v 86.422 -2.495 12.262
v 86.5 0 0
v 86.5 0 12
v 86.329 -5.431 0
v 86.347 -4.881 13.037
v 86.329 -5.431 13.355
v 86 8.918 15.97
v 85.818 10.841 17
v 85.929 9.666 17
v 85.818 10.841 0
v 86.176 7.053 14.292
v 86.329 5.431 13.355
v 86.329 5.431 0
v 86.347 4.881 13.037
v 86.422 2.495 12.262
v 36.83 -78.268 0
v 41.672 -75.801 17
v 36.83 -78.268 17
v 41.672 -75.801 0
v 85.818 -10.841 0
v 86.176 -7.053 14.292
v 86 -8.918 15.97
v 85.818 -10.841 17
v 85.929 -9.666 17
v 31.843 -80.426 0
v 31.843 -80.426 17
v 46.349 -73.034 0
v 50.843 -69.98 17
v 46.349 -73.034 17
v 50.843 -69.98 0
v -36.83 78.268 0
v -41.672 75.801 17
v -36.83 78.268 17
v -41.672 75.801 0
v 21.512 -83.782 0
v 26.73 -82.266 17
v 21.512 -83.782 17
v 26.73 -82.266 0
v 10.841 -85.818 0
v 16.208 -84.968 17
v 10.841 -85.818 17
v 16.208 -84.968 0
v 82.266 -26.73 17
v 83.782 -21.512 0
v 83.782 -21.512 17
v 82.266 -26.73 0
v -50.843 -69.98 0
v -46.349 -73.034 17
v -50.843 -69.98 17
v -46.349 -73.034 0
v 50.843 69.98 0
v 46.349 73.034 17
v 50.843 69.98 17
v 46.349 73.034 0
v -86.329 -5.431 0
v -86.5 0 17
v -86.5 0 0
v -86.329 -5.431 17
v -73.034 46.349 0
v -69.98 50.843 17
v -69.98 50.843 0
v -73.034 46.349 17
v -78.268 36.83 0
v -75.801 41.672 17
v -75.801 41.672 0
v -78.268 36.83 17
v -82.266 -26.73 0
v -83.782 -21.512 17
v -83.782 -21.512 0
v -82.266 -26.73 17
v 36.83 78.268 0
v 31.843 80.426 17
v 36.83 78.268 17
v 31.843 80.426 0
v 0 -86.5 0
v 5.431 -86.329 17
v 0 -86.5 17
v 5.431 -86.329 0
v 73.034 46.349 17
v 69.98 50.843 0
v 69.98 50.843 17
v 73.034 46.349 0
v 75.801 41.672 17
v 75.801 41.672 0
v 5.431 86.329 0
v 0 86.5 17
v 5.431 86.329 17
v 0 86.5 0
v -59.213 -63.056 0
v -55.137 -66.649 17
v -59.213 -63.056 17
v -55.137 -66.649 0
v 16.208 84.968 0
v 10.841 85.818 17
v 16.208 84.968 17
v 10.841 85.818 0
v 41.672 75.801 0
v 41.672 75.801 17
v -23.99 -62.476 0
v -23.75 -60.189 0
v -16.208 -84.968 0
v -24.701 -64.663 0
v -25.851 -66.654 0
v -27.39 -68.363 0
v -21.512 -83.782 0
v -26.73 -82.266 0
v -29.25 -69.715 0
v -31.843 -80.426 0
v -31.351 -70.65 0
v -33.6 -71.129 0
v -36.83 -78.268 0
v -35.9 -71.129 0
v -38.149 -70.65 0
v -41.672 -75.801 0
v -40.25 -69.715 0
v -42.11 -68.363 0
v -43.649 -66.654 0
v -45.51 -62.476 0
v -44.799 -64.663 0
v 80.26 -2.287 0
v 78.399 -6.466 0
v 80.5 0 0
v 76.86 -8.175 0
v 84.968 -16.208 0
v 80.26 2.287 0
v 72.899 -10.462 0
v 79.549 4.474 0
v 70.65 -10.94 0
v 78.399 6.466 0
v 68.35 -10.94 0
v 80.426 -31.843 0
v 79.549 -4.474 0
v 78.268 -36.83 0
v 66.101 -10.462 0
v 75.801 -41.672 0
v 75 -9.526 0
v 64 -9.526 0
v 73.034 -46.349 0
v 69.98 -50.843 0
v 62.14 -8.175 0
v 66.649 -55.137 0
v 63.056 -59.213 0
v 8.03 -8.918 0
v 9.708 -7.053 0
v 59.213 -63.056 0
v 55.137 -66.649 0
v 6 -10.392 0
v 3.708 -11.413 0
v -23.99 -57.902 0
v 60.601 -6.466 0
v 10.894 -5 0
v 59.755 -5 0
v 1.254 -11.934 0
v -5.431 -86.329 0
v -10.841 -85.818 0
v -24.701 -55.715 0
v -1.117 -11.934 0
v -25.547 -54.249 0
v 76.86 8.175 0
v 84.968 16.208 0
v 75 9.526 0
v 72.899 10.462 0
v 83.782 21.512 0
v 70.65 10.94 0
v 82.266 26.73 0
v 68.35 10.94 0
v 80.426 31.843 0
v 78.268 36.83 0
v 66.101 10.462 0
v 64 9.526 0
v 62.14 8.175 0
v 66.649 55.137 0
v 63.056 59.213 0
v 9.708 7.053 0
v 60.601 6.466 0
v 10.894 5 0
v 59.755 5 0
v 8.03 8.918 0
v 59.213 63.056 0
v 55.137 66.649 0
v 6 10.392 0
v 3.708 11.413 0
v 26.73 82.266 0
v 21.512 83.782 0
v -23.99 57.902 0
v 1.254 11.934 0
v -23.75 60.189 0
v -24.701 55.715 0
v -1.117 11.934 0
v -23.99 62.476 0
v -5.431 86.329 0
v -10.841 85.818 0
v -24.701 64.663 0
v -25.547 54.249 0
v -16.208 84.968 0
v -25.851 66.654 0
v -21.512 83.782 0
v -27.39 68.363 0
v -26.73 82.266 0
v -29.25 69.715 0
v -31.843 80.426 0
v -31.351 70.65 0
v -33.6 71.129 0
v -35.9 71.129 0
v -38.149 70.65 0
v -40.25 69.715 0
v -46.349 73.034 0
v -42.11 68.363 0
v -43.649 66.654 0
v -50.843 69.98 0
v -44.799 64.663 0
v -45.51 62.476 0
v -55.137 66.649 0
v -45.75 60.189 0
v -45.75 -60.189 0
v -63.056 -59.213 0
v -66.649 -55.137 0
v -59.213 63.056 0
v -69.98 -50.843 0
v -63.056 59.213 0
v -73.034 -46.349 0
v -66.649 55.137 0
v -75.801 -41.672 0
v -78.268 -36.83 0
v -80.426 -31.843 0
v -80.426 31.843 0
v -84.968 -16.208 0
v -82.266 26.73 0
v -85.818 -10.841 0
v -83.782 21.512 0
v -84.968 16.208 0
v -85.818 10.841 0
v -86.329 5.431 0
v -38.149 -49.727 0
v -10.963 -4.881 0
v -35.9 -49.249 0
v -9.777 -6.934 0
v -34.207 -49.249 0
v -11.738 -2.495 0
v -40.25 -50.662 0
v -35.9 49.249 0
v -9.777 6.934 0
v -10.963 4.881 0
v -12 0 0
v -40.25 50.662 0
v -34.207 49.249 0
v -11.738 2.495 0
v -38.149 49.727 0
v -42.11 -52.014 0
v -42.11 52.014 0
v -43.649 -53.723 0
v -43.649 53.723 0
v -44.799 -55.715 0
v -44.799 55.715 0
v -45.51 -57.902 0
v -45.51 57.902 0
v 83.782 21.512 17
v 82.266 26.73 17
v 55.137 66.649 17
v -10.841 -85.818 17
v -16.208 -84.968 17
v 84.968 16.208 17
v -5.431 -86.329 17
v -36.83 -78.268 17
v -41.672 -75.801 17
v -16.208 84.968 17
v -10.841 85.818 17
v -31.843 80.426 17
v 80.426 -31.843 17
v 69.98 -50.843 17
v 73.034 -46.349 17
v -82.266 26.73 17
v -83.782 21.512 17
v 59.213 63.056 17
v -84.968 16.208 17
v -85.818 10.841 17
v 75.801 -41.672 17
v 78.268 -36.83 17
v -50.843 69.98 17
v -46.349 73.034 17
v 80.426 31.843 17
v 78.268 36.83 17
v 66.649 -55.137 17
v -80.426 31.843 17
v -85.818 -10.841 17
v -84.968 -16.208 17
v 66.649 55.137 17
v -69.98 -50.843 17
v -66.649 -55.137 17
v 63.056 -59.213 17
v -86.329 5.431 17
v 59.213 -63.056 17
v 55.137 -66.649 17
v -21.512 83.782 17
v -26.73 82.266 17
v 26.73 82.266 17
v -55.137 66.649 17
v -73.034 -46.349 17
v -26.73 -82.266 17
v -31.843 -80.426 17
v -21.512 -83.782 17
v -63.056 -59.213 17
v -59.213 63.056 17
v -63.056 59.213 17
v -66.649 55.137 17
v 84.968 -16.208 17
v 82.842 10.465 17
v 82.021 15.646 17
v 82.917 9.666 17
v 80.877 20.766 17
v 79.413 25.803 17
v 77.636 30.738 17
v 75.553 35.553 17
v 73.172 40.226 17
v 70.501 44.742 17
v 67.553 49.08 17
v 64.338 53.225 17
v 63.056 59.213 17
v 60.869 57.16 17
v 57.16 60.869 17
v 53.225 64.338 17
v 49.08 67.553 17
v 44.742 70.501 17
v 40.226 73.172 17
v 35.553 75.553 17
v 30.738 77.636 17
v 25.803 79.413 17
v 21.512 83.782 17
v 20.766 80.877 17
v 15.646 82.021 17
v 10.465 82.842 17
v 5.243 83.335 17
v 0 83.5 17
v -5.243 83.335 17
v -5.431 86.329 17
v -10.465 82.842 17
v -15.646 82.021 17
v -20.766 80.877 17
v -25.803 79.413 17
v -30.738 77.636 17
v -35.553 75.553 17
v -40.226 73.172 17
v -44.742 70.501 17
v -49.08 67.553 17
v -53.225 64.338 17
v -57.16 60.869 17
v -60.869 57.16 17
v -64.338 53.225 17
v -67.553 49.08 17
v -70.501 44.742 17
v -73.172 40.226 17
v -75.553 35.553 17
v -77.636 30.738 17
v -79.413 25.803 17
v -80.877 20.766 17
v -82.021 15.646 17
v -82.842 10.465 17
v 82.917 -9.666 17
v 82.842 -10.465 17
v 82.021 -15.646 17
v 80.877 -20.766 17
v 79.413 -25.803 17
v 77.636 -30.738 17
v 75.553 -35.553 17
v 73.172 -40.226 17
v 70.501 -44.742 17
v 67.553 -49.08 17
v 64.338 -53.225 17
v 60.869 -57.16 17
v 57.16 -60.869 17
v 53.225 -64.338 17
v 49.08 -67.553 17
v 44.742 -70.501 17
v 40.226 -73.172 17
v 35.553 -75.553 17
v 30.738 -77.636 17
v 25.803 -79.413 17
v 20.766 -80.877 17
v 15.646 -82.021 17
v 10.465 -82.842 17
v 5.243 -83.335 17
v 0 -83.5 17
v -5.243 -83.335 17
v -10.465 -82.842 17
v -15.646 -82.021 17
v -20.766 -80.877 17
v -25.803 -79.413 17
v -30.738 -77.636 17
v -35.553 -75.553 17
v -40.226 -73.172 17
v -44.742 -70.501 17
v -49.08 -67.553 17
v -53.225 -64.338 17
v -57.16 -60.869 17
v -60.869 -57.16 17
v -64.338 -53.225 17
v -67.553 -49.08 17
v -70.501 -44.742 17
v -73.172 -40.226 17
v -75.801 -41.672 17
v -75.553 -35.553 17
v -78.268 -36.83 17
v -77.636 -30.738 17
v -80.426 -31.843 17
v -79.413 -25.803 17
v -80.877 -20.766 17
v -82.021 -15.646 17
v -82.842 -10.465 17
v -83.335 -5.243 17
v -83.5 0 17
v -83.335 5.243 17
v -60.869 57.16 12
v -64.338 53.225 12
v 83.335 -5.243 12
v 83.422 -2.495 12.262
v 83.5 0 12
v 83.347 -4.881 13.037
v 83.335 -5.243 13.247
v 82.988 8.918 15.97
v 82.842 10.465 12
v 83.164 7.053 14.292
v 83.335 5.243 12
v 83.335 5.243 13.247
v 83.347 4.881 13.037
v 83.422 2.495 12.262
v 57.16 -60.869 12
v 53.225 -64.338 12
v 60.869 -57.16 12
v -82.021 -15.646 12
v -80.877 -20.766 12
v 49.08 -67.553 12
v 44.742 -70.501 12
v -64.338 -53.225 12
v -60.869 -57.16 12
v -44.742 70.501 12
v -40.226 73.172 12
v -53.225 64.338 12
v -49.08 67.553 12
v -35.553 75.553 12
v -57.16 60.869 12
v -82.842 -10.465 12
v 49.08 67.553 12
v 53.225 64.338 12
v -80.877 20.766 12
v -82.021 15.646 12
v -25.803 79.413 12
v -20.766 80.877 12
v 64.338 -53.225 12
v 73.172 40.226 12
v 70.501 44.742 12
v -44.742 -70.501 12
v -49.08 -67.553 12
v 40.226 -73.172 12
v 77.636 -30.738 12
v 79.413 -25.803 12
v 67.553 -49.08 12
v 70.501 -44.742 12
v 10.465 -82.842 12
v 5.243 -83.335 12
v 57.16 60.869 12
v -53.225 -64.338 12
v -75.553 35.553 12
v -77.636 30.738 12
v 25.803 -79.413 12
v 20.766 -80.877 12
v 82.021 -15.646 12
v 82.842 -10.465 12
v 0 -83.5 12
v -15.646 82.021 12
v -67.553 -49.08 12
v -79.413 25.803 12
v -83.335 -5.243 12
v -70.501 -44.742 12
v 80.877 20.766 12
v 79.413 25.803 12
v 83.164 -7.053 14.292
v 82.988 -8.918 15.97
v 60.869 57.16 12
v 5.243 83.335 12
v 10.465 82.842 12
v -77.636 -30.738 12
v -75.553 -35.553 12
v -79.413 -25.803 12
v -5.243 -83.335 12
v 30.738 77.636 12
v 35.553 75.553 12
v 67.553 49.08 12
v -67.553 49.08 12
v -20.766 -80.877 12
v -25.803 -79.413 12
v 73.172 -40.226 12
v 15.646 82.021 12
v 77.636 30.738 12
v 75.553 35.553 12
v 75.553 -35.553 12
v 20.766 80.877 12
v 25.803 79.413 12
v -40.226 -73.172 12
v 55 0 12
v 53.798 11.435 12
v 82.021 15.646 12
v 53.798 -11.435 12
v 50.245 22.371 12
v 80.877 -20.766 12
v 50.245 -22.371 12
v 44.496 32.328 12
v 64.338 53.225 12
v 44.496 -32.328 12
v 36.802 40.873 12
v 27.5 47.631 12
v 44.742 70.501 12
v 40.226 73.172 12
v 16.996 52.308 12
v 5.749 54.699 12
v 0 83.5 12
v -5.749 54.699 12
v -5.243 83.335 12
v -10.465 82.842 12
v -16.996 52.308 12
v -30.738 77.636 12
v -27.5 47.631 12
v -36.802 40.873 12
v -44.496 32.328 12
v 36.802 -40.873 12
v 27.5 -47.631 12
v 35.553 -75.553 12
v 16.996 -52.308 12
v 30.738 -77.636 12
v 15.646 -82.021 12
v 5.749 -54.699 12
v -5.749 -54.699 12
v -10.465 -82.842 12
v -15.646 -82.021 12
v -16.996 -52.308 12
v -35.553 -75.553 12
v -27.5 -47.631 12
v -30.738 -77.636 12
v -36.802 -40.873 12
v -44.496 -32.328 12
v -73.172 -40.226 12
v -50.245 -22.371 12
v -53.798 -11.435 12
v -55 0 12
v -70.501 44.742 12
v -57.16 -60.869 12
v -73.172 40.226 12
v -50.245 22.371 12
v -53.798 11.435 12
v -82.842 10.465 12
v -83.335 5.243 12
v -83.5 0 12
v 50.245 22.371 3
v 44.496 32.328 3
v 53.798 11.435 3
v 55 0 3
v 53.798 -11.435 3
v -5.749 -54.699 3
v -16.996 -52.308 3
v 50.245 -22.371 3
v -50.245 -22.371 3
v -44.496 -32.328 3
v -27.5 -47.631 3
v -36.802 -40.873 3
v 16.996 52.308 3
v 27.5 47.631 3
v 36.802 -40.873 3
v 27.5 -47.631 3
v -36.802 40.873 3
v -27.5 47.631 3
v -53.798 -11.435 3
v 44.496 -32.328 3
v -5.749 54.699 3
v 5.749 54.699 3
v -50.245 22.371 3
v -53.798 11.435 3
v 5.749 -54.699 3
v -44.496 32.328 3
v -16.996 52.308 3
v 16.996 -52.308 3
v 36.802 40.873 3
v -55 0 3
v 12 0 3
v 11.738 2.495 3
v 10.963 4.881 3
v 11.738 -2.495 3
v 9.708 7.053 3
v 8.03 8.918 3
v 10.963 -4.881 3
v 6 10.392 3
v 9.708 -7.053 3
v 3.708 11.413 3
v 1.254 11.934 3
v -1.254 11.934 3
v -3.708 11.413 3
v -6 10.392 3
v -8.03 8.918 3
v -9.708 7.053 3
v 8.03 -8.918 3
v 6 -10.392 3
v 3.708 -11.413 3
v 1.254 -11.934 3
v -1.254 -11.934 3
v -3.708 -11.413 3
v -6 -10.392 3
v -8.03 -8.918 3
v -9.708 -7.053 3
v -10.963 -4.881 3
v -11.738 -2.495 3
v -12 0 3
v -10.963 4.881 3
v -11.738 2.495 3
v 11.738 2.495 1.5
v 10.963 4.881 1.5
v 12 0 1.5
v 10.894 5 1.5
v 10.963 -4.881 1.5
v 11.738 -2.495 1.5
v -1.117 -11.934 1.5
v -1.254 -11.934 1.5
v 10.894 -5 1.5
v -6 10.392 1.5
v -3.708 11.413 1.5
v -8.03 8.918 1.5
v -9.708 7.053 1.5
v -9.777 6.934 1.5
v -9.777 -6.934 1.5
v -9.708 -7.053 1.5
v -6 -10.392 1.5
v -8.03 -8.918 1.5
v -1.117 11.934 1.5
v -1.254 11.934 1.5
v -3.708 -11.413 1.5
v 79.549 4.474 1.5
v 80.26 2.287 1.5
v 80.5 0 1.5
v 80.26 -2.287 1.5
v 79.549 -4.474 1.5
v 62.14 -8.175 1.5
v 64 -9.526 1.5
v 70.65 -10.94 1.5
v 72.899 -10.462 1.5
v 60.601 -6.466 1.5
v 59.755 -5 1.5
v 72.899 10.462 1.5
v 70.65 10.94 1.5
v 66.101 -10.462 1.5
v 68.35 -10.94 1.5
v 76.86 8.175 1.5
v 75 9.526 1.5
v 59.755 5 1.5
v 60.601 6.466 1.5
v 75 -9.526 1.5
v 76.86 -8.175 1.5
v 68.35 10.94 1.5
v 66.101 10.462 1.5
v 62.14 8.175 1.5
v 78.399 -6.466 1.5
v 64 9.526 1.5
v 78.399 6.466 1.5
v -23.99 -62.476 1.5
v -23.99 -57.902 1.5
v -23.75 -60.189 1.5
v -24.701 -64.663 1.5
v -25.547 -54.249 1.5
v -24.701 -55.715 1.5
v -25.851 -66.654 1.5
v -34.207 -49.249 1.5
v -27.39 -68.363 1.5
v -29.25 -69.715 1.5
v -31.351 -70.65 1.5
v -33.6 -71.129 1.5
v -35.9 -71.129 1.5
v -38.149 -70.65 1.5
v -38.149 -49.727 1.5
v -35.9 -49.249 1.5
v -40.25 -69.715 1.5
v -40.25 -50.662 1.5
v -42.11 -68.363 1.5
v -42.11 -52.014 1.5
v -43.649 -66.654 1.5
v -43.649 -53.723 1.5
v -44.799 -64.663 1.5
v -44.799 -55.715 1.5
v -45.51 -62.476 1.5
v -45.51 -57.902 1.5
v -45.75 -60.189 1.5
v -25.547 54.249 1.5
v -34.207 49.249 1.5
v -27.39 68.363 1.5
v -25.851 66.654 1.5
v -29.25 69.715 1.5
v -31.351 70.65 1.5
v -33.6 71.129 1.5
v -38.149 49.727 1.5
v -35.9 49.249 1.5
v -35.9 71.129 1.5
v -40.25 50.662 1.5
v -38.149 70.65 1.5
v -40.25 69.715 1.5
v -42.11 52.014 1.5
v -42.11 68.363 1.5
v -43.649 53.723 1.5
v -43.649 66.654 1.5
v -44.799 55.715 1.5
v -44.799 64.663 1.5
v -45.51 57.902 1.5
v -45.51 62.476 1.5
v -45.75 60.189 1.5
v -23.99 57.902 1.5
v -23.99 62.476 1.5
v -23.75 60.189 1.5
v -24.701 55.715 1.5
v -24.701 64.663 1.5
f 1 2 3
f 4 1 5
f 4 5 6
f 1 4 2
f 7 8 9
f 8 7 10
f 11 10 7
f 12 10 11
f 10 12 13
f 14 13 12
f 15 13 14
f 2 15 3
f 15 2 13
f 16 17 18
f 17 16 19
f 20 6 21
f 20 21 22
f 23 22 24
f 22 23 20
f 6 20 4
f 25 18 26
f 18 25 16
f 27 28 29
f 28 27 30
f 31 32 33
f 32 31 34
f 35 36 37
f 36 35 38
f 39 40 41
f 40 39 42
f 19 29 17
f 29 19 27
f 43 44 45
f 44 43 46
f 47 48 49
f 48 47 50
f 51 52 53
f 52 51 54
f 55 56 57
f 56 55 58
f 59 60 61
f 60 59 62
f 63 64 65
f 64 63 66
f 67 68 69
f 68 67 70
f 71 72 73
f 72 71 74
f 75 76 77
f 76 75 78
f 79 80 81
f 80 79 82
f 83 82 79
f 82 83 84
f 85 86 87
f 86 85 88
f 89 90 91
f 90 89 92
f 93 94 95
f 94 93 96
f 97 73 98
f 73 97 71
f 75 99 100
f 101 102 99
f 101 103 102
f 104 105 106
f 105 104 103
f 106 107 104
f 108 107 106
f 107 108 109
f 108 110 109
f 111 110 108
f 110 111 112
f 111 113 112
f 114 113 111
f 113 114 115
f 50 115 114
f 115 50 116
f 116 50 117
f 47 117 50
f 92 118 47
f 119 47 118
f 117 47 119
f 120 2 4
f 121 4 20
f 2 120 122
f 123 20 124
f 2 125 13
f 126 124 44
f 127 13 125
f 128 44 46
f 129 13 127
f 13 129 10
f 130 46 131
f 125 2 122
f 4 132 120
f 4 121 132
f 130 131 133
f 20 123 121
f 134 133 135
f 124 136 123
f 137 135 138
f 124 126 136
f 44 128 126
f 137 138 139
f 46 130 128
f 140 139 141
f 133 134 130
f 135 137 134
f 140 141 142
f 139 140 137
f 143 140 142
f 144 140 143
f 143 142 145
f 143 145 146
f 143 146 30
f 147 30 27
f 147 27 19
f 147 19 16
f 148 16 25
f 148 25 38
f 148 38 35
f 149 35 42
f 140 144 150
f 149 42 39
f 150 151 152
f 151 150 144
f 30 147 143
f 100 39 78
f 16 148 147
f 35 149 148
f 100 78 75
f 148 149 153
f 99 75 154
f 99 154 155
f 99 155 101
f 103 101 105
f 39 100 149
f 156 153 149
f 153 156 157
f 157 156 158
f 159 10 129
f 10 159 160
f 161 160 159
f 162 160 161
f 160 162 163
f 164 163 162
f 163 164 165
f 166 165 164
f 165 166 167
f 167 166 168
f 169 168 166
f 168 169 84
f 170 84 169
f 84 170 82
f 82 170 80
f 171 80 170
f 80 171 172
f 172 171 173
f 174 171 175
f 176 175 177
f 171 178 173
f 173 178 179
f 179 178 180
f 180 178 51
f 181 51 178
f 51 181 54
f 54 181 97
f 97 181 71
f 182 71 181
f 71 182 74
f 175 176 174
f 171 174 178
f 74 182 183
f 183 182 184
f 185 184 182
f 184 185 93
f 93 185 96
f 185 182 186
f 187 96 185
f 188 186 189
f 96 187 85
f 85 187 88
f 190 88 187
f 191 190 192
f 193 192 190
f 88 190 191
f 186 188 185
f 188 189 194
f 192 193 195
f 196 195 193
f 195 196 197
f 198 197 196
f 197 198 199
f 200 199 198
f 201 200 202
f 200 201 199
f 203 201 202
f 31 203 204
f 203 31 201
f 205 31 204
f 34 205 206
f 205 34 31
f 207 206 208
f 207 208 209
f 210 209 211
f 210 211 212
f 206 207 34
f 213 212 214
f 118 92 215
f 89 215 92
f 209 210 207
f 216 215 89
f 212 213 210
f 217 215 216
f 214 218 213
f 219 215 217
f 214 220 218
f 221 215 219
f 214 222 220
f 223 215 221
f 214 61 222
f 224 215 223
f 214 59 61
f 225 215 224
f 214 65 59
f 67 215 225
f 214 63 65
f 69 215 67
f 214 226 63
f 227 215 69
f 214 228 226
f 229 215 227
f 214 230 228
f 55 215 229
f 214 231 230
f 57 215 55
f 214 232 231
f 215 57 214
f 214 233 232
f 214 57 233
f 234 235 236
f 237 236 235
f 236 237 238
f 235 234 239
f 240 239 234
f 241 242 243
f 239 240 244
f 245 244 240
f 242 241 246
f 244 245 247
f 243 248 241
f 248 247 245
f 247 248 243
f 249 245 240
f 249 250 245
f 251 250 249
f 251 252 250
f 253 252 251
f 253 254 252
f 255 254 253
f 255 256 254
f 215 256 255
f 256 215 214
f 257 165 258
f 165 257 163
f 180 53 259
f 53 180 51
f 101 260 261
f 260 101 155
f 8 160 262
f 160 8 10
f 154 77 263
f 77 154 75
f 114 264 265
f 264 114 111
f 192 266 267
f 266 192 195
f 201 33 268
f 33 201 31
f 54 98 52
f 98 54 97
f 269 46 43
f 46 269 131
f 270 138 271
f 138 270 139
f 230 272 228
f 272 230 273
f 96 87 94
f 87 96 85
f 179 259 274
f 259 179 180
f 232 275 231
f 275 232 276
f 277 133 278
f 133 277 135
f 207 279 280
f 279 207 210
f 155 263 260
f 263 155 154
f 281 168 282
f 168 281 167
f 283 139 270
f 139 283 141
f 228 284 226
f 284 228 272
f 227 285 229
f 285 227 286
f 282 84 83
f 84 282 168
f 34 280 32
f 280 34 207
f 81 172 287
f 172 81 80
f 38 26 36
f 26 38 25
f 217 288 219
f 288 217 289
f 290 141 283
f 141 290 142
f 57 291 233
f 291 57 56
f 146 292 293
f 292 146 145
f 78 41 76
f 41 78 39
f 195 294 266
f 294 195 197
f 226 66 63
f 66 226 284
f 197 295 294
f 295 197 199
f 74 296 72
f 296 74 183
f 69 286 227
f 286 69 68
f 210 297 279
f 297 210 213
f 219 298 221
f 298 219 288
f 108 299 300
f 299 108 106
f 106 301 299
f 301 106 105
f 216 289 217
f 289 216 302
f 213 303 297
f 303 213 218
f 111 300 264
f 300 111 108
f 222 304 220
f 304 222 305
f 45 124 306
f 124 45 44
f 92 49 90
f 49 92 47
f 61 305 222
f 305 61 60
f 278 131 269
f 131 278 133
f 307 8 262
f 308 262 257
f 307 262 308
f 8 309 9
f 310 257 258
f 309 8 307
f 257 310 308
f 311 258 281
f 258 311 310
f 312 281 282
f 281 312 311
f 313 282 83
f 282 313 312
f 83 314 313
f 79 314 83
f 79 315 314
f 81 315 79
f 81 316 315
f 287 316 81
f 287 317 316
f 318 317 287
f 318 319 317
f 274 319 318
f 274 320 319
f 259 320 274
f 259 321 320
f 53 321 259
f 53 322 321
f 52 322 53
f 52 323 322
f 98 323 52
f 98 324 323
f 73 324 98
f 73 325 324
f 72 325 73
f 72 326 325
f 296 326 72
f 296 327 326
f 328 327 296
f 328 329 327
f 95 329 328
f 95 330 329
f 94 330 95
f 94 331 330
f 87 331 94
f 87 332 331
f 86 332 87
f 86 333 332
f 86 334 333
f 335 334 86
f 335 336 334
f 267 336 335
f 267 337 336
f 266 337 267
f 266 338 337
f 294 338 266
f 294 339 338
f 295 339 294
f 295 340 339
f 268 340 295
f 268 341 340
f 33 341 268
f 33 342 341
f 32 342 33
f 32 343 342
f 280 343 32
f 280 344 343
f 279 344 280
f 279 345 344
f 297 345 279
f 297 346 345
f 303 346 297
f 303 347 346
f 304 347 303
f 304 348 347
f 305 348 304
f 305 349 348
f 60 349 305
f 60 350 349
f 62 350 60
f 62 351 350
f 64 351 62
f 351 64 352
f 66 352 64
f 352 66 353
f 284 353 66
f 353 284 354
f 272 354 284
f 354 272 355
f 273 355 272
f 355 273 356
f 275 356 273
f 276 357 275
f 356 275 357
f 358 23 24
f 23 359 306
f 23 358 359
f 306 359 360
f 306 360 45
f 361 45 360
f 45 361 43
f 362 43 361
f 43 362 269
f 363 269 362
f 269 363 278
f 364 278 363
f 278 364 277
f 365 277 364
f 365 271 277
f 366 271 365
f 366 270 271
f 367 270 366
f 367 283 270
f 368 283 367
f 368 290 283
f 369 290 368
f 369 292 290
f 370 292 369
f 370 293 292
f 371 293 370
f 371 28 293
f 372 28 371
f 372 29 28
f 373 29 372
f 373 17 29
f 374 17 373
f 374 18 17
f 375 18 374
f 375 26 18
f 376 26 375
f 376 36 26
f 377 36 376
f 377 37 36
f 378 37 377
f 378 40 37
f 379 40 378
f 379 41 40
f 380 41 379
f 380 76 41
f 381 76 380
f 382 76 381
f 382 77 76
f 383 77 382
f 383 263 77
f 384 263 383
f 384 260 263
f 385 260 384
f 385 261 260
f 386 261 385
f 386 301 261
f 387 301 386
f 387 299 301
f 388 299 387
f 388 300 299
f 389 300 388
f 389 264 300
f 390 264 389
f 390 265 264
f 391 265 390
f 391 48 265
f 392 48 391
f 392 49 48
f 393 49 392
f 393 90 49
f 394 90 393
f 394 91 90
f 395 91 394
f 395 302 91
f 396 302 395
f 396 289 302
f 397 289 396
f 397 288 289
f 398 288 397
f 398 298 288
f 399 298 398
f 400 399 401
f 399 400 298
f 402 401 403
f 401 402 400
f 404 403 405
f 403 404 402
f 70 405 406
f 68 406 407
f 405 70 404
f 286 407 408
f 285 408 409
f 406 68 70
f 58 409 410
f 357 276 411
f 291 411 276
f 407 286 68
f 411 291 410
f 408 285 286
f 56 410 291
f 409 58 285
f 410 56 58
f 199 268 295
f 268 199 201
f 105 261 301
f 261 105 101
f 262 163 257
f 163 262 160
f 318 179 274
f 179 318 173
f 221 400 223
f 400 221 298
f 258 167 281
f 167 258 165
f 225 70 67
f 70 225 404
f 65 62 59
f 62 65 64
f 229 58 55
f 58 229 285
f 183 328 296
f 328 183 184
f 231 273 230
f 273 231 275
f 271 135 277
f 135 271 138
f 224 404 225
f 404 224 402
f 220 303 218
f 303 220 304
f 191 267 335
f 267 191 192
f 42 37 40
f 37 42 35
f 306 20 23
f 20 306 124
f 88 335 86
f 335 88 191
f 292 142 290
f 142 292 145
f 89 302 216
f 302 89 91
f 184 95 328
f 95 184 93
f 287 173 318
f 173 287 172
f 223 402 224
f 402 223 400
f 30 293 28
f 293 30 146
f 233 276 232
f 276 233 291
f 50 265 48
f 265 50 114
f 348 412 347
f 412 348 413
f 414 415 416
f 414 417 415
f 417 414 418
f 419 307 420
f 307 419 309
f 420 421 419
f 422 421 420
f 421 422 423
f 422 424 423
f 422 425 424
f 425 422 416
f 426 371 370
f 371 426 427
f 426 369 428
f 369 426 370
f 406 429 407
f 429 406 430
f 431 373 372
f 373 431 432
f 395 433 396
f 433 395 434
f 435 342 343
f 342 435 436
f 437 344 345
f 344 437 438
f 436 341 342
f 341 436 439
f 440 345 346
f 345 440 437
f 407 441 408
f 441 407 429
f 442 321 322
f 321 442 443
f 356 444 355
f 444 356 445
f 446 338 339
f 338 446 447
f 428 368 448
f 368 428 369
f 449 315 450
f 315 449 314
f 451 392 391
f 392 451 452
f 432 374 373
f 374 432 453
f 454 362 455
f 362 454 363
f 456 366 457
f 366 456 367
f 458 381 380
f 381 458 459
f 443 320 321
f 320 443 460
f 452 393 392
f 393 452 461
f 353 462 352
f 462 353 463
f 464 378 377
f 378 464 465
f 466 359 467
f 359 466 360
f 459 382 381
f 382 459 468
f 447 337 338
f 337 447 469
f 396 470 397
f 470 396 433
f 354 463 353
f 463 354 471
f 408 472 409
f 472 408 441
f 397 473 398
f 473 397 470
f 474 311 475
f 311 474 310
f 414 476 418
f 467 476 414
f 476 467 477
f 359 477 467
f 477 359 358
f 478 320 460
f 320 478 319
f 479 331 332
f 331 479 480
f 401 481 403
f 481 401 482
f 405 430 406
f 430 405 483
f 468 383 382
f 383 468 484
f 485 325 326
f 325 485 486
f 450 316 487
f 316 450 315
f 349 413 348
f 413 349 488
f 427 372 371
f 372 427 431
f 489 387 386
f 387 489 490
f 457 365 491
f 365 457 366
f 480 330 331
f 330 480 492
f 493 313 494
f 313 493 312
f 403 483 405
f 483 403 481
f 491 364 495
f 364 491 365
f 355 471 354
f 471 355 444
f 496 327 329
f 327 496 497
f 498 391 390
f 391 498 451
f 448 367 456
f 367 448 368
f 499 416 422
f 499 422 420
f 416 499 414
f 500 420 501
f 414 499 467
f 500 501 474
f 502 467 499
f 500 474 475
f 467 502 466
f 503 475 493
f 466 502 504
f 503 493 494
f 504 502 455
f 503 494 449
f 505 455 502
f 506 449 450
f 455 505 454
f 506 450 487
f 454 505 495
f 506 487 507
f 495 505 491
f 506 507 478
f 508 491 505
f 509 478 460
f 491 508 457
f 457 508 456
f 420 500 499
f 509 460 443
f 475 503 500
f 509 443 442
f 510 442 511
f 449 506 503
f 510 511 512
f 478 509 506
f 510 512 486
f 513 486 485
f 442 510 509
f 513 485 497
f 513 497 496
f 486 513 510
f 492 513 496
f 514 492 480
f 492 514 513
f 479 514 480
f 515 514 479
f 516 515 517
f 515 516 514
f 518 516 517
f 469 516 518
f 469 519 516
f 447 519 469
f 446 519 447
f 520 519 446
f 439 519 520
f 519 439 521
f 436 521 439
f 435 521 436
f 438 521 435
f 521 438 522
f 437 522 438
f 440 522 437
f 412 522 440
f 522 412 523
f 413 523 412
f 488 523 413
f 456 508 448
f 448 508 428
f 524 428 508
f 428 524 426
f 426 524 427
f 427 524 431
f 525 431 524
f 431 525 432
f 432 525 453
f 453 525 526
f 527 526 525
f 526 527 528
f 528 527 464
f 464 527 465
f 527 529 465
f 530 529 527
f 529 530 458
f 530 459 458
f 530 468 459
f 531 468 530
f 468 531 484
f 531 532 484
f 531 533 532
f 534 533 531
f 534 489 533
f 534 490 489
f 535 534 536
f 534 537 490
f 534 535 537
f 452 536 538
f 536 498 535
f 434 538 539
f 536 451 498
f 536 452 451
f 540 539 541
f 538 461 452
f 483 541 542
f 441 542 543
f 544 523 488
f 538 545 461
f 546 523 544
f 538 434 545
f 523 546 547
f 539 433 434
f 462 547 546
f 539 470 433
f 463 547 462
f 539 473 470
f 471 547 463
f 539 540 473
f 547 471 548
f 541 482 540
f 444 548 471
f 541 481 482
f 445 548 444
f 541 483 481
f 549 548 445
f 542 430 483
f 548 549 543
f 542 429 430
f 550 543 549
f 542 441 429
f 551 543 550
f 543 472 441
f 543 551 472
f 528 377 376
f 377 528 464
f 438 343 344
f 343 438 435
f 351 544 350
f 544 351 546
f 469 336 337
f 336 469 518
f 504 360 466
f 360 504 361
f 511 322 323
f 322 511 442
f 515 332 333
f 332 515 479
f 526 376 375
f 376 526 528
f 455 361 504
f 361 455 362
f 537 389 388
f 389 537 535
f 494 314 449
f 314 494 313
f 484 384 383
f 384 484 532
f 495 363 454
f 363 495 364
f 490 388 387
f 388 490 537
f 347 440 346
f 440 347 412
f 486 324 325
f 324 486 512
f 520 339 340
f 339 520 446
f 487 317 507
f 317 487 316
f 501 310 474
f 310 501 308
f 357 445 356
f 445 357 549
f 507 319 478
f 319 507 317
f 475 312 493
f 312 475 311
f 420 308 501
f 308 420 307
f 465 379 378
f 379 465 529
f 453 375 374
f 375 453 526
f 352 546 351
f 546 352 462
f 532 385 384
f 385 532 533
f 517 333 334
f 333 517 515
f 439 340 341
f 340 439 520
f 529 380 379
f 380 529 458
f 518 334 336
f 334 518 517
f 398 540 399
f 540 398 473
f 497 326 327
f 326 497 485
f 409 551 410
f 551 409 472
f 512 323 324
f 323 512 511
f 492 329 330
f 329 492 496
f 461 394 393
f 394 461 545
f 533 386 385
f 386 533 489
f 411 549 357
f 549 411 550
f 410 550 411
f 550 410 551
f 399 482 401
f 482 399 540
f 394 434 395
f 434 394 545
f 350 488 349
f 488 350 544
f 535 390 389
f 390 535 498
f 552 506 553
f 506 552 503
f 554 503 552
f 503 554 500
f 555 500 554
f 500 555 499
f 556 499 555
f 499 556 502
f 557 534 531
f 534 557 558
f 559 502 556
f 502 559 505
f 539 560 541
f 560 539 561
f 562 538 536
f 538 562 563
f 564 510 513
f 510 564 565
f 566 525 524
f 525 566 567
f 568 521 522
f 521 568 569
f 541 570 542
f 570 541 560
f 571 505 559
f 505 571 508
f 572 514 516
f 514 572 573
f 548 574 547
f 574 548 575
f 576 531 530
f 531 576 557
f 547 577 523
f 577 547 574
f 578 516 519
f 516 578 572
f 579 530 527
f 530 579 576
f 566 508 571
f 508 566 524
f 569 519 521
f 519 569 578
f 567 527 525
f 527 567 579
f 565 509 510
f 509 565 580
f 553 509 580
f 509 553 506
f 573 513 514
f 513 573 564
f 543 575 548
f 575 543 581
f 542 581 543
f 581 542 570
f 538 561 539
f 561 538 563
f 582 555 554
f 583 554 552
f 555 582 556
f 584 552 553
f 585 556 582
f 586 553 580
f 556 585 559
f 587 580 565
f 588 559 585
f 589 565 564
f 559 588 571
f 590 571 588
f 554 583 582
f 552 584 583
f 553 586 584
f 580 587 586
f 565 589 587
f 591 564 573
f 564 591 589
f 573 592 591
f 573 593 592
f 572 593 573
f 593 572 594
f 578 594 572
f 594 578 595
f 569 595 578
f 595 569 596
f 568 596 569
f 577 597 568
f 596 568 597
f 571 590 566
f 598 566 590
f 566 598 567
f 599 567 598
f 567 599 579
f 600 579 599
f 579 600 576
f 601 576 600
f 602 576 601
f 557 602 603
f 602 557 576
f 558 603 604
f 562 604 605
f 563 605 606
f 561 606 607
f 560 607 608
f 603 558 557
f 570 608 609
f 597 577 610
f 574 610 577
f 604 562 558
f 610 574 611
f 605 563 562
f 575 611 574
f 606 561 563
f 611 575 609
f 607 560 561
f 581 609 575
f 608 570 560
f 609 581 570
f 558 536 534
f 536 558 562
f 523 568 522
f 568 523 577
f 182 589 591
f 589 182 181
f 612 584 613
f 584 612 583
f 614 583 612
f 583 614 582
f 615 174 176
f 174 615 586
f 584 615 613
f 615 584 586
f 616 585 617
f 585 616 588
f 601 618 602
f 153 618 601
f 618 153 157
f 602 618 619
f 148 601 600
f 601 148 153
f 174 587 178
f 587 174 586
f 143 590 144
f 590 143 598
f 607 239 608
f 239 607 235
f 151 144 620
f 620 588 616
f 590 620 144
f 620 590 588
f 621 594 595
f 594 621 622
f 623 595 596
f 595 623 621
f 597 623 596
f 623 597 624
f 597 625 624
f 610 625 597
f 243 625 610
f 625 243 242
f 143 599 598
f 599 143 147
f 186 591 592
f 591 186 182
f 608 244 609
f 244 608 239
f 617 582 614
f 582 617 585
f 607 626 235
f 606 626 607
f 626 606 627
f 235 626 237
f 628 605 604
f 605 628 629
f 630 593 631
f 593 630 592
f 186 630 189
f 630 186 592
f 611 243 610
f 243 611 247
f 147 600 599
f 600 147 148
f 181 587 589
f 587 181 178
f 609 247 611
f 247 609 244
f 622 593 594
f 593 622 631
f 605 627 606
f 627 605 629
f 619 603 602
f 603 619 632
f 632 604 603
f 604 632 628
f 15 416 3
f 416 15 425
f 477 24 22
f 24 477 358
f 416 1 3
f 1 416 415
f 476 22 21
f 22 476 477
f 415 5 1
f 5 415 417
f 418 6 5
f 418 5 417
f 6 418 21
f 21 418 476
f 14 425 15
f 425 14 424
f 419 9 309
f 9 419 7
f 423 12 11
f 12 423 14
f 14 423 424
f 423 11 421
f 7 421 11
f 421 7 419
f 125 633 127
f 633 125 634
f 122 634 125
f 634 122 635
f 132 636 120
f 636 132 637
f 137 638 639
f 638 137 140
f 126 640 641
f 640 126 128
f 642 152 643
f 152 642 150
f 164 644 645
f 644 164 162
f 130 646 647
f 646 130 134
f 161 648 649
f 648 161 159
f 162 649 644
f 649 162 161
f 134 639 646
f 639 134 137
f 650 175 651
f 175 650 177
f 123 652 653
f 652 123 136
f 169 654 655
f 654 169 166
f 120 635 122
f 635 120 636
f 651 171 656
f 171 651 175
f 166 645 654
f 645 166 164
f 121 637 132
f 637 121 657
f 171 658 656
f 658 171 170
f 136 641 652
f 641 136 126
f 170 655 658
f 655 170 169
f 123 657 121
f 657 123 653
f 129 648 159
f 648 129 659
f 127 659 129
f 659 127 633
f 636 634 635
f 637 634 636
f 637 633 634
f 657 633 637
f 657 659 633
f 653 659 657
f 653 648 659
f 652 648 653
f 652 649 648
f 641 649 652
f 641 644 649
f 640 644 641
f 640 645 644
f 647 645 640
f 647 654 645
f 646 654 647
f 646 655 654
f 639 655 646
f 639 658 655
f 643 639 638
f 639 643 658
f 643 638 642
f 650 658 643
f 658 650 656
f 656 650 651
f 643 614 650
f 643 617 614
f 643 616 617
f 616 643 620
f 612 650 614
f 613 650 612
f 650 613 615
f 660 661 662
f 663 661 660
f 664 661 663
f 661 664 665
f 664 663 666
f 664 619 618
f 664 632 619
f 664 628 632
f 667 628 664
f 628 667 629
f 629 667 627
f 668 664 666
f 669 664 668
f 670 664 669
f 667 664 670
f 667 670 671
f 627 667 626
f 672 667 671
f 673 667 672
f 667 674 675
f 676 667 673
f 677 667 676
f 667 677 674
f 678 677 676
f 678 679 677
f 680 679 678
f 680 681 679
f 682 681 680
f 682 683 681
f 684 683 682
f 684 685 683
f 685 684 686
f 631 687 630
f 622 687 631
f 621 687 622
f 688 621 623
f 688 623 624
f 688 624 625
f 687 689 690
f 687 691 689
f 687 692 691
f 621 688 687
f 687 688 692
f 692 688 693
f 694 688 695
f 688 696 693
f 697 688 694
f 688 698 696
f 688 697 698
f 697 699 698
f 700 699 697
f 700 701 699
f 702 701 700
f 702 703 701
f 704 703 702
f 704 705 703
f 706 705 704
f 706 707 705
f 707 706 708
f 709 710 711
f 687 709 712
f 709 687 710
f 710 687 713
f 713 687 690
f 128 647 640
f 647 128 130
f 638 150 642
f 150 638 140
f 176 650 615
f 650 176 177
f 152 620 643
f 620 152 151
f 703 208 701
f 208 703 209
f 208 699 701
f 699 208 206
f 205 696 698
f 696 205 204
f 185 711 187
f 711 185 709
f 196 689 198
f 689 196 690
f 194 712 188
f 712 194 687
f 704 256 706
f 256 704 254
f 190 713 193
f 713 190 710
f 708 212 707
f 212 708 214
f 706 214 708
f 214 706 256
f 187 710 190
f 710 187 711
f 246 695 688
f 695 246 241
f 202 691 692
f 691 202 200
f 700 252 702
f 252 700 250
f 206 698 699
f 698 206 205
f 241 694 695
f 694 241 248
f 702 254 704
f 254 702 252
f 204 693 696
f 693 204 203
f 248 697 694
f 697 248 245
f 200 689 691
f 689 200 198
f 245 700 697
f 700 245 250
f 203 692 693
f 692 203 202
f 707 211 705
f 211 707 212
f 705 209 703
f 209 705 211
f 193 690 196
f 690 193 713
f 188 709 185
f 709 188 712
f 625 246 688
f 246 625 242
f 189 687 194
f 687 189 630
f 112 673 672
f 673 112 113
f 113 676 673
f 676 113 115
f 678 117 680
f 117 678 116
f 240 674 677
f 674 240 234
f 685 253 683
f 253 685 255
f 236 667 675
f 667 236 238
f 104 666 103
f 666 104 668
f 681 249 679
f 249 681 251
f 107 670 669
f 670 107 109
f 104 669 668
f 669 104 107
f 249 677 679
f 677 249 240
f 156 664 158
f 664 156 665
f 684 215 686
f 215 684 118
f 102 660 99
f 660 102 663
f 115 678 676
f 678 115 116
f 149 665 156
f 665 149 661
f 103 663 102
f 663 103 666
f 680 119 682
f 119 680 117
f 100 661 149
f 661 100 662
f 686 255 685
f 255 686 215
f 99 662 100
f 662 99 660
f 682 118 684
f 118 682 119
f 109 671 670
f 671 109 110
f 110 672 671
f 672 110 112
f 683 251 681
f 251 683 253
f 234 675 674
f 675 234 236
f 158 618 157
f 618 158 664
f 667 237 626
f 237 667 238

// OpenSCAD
//Diameter of the connection station of the Kettle (mm)
station_diameter = 167;

// With of cable protuding from connection station (mm)
cable_width=12;

/* [advaced configurations] */
//wall and floor thickness
wall=3;

r1=station_diameter/2+wall;
r2=r1-wall;
r3=110/2;

//total height
h1=17;
//height of sensor pocket
h2= 12;

/*cable trap params*/
//number of cable traps
cn=1;
cr=cable_width;

//FSR dimensions
//radius of FSR sensor area
FSRr=11;
r4=FSRr+1;
// width of FSR sensor connector section
FSRw=10;


module main(){
	difference(){
		cylinder(r = r1, h = h1, $fn=100);
		translate([0,0,h2]) cylinder(r = r2, h = h1-h2, $fn=100);
		translate([0,0,wall]) cylinder(r = r3, h = h1-wall);
		cylinder(r = r4, h=wall);
	}
}

module traps(){
	ch = h1-h2-cr;
	for( a = [0:360/cn:360]) {
       rotate([0,0,a]) translate([r1,0,0]) rotate([0,-90,0])
			hull(){
				cylinder(r=cr,h=wall*2);
				translate([cr/2,-cr,0]) cube([ch,cr*2,wall*2]);
			}
	}
}

module kettleBase(){
	difference(){
		main();
		translate([0,0,h2+cr]) traps();
		for( a = [0:360/3:360]) {
       rotate([0,0,a]) translate([r1-FSRr-wall*2,0,0])
			FSRtrap(r1-FSRr*2-wall*2,wall/2);
	}
	}
}

module FSRtrap(l,h){
	union(){
		cylinder(r=FSRr,h=h);
		translate([-l-FSRr,-FSRw/2,0]) cube([l+FSRr,FSRw,h]);
	}
}
kettleBase();
